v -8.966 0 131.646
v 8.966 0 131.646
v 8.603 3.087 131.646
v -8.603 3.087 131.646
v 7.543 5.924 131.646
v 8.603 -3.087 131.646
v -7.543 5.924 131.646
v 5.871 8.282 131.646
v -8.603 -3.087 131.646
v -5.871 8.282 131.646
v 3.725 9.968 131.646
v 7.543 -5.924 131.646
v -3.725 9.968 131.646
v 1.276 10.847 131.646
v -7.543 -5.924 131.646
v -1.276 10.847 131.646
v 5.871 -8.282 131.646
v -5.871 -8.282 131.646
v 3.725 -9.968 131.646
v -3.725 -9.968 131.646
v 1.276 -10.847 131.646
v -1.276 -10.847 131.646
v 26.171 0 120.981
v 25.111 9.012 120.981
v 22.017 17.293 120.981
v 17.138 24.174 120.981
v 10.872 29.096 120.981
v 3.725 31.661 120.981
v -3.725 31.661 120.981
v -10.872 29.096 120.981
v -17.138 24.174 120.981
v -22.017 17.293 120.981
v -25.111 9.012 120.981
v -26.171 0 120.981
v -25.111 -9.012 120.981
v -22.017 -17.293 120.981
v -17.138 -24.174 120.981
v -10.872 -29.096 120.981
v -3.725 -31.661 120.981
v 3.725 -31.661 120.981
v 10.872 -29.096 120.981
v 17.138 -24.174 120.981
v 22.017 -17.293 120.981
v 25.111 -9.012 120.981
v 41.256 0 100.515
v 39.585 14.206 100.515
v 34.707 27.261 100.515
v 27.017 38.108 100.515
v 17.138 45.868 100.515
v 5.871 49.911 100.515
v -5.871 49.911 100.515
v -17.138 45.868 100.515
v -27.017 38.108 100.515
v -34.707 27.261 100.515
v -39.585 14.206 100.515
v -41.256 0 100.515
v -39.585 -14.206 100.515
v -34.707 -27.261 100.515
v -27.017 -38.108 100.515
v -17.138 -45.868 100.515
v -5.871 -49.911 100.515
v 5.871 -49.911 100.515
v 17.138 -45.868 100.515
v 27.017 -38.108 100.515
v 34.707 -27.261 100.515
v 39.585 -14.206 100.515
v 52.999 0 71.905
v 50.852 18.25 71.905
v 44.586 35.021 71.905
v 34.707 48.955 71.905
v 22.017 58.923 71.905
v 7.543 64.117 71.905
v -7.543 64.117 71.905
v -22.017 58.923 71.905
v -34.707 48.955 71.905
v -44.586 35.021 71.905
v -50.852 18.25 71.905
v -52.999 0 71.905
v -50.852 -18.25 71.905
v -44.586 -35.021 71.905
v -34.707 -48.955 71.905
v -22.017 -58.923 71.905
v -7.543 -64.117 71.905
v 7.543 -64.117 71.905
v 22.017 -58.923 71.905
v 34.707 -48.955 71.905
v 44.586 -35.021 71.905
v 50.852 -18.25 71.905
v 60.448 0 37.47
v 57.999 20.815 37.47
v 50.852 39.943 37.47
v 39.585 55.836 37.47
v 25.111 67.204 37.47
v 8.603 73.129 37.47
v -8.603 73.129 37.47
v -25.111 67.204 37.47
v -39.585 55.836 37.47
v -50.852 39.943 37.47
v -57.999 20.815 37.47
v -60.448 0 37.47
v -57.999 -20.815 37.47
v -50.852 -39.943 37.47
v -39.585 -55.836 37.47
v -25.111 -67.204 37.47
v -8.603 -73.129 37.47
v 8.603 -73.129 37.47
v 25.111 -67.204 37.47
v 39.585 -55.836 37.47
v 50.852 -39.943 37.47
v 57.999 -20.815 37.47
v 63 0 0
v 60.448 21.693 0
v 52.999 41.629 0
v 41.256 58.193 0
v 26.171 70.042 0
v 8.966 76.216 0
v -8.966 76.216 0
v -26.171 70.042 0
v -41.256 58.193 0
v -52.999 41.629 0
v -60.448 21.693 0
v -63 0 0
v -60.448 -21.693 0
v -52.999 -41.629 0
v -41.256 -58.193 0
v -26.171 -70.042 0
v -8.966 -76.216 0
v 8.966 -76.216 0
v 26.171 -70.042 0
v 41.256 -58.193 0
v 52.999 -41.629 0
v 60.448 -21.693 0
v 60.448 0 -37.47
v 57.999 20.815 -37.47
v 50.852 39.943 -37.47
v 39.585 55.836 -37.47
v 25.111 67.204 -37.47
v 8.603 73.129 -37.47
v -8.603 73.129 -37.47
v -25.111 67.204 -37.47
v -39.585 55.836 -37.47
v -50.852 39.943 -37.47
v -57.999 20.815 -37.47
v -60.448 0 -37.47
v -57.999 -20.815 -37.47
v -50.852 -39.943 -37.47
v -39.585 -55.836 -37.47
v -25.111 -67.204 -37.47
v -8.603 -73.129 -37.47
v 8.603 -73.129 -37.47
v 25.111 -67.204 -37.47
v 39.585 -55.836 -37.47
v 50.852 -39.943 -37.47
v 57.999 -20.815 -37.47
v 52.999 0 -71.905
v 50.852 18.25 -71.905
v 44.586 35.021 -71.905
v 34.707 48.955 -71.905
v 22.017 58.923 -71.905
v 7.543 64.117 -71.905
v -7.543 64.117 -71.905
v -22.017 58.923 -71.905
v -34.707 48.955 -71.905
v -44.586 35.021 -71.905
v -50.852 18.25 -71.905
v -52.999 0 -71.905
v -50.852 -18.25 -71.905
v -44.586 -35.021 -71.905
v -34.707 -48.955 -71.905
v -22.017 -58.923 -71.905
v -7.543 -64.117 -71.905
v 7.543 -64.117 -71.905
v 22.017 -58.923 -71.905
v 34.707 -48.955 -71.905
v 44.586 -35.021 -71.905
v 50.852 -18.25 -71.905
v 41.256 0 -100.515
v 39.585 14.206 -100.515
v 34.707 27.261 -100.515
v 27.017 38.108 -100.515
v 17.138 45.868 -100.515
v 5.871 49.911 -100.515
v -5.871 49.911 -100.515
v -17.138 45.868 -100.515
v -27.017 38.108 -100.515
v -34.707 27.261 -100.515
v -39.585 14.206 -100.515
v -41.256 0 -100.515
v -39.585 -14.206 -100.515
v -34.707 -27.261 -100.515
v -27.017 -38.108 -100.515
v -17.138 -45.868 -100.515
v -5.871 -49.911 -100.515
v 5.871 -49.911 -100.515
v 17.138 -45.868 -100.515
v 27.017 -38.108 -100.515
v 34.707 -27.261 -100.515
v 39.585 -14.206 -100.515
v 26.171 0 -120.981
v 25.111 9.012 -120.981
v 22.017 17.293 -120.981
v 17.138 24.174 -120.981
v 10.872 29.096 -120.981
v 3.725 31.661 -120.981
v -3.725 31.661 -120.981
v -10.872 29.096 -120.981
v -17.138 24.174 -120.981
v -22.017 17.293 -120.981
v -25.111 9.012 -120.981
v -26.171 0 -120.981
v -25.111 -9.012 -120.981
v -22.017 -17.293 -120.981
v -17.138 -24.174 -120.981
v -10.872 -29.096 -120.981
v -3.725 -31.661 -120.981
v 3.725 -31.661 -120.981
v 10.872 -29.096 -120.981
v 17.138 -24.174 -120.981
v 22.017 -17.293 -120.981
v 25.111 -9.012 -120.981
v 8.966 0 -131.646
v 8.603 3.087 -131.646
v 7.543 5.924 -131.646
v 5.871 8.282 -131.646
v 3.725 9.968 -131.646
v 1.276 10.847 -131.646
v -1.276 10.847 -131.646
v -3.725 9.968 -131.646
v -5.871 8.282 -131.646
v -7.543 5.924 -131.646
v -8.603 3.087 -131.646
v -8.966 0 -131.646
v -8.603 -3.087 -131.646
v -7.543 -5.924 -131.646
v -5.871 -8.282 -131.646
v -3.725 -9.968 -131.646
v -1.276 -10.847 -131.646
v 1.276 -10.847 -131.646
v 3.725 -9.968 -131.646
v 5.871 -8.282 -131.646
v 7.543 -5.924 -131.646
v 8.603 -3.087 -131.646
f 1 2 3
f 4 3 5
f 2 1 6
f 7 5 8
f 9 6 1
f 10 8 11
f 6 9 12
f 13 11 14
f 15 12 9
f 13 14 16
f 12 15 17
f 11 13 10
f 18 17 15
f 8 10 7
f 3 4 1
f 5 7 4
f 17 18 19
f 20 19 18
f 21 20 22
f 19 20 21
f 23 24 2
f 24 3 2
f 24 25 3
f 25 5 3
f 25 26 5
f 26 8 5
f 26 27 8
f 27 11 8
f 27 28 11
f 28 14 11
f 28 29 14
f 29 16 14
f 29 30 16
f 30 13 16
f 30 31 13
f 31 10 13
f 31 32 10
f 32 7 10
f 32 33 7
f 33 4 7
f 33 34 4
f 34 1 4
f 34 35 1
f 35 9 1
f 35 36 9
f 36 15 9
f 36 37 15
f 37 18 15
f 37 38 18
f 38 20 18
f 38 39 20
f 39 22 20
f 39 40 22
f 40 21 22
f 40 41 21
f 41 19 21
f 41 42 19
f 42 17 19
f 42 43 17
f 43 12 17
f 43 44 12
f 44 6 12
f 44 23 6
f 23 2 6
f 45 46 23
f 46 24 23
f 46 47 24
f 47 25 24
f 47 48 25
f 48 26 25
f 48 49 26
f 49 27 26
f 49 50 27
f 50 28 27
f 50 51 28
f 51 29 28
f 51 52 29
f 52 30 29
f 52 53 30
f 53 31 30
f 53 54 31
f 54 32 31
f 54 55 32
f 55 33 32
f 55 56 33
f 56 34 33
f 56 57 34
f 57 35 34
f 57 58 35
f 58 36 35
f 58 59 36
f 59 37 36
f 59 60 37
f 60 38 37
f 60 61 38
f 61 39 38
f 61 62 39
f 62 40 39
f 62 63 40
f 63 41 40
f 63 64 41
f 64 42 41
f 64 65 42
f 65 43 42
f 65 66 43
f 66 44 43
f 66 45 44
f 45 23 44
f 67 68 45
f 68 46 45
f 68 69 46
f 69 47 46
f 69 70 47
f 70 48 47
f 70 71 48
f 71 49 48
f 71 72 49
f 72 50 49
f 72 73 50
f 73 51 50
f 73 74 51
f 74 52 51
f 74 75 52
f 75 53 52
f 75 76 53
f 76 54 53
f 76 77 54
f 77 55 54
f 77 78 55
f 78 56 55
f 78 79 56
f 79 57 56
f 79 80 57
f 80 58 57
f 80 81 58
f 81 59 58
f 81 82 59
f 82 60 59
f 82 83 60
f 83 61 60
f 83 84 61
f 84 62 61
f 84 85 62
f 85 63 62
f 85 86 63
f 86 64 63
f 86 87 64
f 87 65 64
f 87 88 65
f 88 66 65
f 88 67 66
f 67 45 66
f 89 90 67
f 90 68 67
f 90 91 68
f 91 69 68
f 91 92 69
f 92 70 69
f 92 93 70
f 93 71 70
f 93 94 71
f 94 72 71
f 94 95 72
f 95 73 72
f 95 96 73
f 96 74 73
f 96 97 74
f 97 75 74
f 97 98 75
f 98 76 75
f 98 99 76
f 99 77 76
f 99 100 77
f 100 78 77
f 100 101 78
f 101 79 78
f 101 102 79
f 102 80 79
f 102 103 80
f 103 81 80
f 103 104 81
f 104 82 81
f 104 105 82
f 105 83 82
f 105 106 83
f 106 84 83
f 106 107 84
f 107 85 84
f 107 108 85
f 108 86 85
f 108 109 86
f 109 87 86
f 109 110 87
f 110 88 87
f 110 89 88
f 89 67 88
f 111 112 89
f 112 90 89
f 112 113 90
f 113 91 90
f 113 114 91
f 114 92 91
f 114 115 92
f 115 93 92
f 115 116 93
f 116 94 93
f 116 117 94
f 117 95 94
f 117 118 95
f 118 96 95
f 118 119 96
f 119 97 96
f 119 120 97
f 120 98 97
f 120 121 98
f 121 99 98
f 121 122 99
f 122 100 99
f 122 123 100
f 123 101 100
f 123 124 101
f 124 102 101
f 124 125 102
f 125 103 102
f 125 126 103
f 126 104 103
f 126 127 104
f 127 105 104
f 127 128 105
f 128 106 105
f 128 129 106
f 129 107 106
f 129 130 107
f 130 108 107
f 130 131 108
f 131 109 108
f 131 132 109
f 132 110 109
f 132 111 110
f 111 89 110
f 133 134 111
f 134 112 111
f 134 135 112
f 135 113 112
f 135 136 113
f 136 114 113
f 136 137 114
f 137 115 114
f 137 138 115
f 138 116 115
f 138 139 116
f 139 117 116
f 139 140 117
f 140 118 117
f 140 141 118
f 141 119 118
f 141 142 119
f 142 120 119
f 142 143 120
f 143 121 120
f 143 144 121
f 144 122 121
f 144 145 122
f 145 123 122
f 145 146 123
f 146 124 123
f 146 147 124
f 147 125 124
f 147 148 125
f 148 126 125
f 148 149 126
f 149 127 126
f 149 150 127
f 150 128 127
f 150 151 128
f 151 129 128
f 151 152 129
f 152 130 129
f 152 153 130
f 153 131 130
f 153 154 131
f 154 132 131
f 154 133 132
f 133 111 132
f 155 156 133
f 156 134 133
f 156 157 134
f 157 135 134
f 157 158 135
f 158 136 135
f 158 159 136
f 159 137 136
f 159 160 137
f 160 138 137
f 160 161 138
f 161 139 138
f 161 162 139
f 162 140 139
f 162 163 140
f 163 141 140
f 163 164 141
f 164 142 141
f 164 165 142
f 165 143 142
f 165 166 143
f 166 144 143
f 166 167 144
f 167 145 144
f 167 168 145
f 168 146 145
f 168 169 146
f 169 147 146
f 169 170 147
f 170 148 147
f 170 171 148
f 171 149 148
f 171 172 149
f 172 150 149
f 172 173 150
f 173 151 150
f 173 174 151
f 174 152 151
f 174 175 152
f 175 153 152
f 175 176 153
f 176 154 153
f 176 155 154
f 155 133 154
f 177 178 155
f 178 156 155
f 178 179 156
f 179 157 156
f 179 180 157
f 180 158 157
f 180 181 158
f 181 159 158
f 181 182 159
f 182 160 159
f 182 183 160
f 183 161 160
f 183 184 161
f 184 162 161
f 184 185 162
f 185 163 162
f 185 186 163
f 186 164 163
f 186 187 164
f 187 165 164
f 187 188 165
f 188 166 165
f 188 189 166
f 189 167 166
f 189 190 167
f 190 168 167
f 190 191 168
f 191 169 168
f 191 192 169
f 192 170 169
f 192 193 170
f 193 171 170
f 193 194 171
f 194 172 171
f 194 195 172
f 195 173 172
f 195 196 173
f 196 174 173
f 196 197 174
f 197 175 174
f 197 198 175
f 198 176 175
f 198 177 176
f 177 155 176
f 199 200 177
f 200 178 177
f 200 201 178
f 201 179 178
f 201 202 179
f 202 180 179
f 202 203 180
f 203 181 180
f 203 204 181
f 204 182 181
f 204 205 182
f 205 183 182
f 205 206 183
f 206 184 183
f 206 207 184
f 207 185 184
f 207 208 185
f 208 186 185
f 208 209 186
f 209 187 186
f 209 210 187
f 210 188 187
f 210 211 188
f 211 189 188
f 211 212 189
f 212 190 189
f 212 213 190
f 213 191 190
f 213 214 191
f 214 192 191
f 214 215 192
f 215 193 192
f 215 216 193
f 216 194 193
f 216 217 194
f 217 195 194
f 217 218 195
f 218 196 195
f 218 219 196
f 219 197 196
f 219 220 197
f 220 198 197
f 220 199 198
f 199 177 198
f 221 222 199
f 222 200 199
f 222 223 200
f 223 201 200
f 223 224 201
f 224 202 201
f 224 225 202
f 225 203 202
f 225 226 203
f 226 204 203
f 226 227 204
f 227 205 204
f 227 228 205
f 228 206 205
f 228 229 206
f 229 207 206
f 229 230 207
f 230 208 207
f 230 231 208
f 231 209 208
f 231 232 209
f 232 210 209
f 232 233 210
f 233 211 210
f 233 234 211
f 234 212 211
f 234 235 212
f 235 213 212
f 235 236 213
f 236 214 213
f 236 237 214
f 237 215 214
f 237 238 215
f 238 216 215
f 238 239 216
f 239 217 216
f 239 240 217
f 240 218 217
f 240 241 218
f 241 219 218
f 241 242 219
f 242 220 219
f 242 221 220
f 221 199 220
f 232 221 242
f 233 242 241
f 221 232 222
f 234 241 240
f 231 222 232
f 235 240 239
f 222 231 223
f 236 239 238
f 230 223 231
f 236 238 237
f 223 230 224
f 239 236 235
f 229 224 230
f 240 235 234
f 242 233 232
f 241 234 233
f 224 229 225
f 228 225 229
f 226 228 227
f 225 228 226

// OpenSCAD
// Generated by SolidPython 1.0.1 on 2020-07-29 00:46:48


scale(v = [9, 11, 19]) {
	sphere(r = 7);
}
/***********************************************
*********      SolidPython code:      **********
************************************************
 
# import packages: SolidPython
from solid import *
from solid.utils import *
from itertools import chain, combinations, permutations


class Resize:

    def __init__(self, scad_file):
        self.scad_file = scad_file
        #self.scad_file = import_scad(scad_file)
        # cone/cylinder param:
        self.r1 = 0
        self.r2 = 0
        self.h = 0
        # rectangular prism param:
        self.w = 0
        self.l = 0
        # ellipse param:
        self.r = 0

    # import OpenScad code (file name corresponds to shape)


    # classify shape + parameters
    def assign(self, param1, param2, param3):
        if self.scad_file == 'cone.scad':
            self.r1 = param1
            self.r2 = param2
            self.h = param3
        elif self.scad_file == 'cylinder.scad':
            self.r1 = param1
            self.r2 = param2
            self.h = param3
        elif self.scad_file == 'rectangularPrism.scad':
            self.h = param1
            self.l = param2
            self.w = param3
        else:
            self.r = param1
            self.h = param2

    # resize parameters
    def iterate(self):
        x = range(3, 20, 2)
        i = 1
        if self.scad_file == 'cone.scad':
            tempList = list(permutations(x, 2))
            for temp in tempList:
                param1 = temp[0]
                param2 = temp[1]
                filepath = 'produced_scad_files/' + 'cone' + str(param1) + '_' + str(param2) + '_' + '.scad'
                scad_render_to_file(cylinder(h=param1, r1=param2, r2=0), filepath)

        elif self.scad_file == 'cylinder.scad':
            tempList = list(permutations(x, 3))
            for temp in tempList:
                param1 = temp[0]
                param2 = temp[1]
                filepath = 'produced_scad_files/' + 'cylinder' + str(param1) + '_' + str(param2) + '_' + '.scad'
                scad_render_to_file(cylinder(h=param1, r1=param2, r2=param2), filepath)

        elif self.scad_file == 'rectangularPrism.scad':
            tempList = list(permutations(x, 3))
            for temp in tempList:
                param1 = temp[0]
                param2 = temp[1]
                param3 = temp[2]
                filepath = 'produced_scad_files/' + 'rectangularPrism' + str(param1) + '_' + str(param2) + '_' + str(
                    param3) + '.scad'
                scad_render_to_file(cube(size=(param1, param2, param3)), filepath)

        elif self.scad_file == 'ellipse.scad':
            tempList = list(permutations(x, 4))
            for temp in tempList:
                param1 = temp[0]
                param2 = temp[1]
                param3 = temp[2]
                param4 = temp[3]
                filepath = 'produced_scad_files/' + 'ellipse' + str(param1) + '_' + str(param2) + '_' + str(param3) + '_' + str(param4) + '.scad'
                scad_render_to_file(scale([param1, param2, param3])(sphere(r=param4)), filepath)

    def render_to_scadfile(self):
        scad_render_to_file(scad, 'example.scad') 
 
************************************************/
